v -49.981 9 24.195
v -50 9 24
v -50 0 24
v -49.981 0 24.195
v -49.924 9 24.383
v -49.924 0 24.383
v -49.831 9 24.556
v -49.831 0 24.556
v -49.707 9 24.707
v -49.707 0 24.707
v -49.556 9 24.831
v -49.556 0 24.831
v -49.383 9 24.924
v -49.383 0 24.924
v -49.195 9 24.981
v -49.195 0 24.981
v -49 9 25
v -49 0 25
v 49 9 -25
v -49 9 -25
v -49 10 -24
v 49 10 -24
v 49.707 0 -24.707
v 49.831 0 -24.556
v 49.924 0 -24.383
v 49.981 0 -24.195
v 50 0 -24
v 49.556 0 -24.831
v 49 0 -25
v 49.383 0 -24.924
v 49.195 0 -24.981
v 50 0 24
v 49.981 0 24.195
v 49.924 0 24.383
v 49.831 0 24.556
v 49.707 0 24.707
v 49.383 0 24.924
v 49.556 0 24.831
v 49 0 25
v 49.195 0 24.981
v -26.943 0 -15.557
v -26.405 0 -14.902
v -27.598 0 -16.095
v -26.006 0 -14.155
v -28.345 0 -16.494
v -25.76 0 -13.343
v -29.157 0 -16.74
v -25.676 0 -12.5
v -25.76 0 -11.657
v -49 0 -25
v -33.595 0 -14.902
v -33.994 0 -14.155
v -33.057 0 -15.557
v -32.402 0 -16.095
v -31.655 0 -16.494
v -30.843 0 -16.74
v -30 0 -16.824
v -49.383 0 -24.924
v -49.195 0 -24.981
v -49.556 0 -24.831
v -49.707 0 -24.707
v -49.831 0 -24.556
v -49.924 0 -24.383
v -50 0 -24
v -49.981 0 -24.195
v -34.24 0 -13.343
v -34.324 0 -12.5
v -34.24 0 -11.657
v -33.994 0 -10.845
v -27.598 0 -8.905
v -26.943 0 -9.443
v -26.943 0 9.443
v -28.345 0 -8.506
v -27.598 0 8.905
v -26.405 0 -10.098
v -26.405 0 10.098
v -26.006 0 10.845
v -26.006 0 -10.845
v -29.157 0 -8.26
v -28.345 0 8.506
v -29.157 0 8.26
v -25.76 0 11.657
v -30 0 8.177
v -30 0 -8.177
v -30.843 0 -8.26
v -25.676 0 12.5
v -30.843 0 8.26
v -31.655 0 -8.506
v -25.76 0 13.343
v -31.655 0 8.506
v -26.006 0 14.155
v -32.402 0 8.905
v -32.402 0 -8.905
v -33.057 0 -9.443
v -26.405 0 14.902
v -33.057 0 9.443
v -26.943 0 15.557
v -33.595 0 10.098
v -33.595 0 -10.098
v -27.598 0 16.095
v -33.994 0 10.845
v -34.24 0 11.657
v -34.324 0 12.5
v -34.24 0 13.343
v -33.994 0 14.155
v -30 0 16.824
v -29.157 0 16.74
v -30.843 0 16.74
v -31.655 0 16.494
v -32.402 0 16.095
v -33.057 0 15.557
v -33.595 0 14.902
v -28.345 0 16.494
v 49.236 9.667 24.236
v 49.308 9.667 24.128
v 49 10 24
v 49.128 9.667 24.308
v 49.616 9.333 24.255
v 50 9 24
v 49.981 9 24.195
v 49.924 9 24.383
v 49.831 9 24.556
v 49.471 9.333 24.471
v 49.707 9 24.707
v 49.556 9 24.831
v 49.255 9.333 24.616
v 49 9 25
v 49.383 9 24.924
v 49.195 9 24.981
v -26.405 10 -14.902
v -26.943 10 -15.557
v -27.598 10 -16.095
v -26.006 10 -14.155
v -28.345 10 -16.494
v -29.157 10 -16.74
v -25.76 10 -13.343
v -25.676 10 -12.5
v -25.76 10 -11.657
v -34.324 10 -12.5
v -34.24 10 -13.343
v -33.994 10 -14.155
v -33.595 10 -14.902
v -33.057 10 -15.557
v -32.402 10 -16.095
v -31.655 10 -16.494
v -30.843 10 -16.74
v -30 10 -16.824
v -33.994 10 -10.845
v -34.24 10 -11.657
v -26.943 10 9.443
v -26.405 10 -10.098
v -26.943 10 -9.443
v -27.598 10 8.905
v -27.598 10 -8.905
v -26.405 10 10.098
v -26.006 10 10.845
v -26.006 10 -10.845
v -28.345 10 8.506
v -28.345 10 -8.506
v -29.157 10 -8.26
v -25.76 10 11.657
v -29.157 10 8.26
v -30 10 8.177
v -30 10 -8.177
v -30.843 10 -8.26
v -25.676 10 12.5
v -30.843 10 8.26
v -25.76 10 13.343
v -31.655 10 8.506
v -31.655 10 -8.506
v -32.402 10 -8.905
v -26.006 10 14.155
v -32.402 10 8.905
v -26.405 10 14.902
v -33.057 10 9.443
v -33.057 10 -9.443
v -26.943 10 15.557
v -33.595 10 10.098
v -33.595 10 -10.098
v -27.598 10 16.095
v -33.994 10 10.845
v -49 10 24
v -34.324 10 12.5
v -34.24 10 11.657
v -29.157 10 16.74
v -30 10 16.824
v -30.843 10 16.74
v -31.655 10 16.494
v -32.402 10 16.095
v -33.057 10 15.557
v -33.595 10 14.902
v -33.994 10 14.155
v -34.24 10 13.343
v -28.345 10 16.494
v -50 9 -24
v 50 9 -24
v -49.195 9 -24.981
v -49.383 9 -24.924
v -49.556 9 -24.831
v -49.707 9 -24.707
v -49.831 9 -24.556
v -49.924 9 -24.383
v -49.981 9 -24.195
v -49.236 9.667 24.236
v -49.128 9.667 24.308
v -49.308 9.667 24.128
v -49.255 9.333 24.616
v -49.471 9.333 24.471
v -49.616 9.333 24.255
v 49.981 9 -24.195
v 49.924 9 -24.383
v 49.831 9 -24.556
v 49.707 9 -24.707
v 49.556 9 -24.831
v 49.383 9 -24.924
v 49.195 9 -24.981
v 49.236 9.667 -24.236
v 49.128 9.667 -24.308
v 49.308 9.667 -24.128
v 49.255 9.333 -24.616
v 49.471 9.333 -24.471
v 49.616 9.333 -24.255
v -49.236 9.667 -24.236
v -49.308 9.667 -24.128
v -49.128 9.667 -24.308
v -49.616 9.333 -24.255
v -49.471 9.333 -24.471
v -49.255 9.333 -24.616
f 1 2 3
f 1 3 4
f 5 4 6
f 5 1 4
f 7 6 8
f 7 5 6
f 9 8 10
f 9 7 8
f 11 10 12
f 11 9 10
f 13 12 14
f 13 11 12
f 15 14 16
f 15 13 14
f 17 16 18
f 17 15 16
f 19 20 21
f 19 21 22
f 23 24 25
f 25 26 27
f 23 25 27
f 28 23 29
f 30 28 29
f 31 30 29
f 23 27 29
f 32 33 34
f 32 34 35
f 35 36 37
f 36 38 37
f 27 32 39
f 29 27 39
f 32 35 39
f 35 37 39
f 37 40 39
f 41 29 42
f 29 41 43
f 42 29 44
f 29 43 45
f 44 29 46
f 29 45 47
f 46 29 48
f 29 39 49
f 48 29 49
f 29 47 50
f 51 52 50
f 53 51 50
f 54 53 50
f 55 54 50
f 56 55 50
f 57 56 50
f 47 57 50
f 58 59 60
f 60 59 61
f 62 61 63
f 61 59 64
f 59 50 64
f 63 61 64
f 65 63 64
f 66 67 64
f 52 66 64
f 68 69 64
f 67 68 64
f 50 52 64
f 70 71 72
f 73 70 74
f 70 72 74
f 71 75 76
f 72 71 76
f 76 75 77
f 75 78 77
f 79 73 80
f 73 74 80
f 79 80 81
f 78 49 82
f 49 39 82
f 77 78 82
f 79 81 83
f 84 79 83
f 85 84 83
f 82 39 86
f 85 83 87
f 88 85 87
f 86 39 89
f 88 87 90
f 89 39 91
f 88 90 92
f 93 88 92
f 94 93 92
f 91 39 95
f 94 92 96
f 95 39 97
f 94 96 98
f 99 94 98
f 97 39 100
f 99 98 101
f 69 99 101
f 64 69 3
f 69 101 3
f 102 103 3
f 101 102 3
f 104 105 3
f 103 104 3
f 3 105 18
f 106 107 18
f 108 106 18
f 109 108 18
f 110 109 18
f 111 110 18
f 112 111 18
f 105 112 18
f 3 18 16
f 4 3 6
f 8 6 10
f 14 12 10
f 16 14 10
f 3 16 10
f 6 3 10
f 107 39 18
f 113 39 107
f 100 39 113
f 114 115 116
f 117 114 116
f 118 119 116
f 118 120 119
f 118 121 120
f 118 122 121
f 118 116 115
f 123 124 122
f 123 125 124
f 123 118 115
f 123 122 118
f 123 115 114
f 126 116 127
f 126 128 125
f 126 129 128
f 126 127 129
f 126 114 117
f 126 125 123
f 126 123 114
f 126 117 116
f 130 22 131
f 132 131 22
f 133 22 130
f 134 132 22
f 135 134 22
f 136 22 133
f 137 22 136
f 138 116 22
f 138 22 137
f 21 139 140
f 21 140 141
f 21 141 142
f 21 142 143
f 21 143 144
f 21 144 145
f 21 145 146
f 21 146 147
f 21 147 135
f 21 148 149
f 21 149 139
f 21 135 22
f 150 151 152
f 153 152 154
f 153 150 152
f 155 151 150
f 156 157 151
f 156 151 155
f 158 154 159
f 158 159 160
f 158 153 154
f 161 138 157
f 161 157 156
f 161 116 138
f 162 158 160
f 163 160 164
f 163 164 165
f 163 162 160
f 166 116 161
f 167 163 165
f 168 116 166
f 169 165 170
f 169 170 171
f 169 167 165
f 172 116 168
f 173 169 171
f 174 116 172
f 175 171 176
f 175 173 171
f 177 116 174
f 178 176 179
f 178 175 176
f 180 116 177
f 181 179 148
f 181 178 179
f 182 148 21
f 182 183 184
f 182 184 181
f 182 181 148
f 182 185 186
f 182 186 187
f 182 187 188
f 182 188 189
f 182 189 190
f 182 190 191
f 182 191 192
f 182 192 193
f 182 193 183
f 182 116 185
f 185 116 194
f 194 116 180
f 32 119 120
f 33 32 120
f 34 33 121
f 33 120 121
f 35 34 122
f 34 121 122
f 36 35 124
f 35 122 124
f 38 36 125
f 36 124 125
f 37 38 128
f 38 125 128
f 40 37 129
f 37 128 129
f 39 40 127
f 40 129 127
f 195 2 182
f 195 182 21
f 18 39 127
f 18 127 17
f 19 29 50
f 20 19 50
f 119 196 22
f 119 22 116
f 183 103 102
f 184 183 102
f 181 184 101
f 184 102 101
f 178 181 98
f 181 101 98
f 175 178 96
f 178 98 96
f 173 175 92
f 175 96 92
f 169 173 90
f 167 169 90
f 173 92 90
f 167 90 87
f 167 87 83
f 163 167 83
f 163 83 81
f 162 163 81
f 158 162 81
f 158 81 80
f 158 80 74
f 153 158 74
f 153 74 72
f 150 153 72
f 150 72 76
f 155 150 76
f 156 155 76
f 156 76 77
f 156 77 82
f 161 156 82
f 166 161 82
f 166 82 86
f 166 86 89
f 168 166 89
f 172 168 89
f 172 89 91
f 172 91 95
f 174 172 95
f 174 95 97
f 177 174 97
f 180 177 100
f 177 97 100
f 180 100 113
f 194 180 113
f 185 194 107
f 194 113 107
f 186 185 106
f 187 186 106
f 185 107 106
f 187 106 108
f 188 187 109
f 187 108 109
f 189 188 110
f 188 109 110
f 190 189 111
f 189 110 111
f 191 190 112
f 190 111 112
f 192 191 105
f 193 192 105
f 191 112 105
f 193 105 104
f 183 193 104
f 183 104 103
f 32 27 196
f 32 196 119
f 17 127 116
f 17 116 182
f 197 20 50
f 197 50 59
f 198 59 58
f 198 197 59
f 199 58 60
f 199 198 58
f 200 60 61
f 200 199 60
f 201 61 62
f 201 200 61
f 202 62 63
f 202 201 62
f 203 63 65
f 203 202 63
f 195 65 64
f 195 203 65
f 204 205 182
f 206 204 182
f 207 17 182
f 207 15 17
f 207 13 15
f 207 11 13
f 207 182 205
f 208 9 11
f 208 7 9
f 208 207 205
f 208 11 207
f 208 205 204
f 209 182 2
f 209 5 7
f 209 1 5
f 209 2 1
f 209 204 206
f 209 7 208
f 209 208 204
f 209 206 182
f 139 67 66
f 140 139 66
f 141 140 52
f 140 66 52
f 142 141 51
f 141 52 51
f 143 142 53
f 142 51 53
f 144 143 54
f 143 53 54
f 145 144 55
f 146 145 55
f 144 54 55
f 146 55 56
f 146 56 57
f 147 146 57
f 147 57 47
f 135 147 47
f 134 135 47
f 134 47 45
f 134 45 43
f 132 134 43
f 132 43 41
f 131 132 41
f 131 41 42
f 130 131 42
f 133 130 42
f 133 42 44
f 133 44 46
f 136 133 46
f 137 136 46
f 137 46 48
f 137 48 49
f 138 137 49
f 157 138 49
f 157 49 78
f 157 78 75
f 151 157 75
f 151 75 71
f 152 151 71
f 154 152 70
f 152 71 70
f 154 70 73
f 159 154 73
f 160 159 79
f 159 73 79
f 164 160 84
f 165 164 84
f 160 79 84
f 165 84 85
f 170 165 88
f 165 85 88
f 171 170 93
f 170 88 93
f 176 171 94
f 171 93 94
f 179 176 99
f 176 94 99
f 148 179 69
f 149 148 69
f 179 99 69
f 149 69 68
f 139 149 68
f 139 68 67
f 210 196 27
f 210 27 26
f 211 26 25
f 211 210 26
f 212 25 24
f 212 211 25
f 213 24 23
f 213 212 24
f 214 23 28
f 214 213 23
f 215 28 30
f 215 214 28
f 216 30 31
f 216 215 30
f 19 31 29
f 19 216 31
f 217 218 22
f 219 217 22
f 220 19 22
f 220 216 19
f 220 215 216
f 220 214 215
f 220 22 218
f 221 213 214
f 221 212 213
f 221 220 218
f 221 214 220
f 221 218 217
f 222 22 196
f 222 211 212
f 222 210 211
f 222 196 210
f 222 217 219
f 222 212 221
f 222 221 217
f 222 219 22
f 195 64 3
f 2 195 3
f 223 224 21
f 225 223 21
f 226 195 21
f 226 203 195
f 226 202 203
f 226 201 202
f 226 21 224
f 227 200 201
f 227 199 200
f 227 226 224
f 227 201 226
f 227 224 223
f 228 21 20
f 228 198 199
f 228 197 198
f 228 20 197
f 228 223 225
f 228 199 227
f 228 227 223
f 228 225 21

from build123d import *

# Parameters (mm, degrees)
SKETCH_1_W          = 100
SKETCH_1_H          = 50
EXTRUDE_1_DEPTH     = 10
FILLET_1_R          = 1
CHAMFER_2_SIZE      = 1
HOLE_WIZARD_1_D     = 8.647
HOLE_WIZARD_1_DEPTH = 26.2
HOLE_WIZARD_1_TIP   = 2.597820886


with BuildPart() as part:
    # 草圖1 → 擠出1 (new body)
    with BuildSketch(Plane(origin=(0, 0, 0), x_dir=(-1, 0, 0), z_dir=(0, 1, 0))):
        Rectangle(SKETCH_1_W, SKETCH_1_H)
    extrude(amount=EXTRUDE_1_DEPTH)

    # 圓角1
    fillet_1_edges = [part.edges().sort_by_distance(p)[0] for p in [
        (-50, 5, -25),
        (50, 5, -25),
        (50, 5, 25),
        (-50, 5, 25),
    ]]
    fillet(fillet_1_edges, radius=FILLET_1_R)

    # 倒角2
    chamfer_2_edges = [part.edges().sort_by_distance(p)[0] for p in [
        (0, 10, 25),
        (-50, 10, 0),
        (50, 10, 0),
        (0, 10, -25),
        (49.707106781, 10, 24.707106781),
        (49.707106781, 10, -24.707106781),
        (-49.707106781, 10, -24.707106781),
        (-49.707106781, 10, 24.707106781),
    ]]
    chamfer(chamfer_2_edges, length=CHAMFER_2_SIZE)

    # 孔1
    with Locations(Plane(origin=(0, 10, 0), x_dir=(1, 0, 0), z_dir=(0, 1, 0))):
        with Locations((-30, 12.5), (-30, -12.5)):
            Hole(HOLE_WIZARD_1_D / 2, depth=HOLE_WIZARD_1_DEPTH)
            with Locations((0, 0, -(HOLE_WIZARD_1_DEPTH + HOLE_WIZARD_1_TIP / 2))):  # 118° drill point
                Cone(0, HOLE_WIZARD_1_D / 2, HOLE_WIZARD_1_TIP, mode=Mode.SUBTRACT)


solid = part.part
